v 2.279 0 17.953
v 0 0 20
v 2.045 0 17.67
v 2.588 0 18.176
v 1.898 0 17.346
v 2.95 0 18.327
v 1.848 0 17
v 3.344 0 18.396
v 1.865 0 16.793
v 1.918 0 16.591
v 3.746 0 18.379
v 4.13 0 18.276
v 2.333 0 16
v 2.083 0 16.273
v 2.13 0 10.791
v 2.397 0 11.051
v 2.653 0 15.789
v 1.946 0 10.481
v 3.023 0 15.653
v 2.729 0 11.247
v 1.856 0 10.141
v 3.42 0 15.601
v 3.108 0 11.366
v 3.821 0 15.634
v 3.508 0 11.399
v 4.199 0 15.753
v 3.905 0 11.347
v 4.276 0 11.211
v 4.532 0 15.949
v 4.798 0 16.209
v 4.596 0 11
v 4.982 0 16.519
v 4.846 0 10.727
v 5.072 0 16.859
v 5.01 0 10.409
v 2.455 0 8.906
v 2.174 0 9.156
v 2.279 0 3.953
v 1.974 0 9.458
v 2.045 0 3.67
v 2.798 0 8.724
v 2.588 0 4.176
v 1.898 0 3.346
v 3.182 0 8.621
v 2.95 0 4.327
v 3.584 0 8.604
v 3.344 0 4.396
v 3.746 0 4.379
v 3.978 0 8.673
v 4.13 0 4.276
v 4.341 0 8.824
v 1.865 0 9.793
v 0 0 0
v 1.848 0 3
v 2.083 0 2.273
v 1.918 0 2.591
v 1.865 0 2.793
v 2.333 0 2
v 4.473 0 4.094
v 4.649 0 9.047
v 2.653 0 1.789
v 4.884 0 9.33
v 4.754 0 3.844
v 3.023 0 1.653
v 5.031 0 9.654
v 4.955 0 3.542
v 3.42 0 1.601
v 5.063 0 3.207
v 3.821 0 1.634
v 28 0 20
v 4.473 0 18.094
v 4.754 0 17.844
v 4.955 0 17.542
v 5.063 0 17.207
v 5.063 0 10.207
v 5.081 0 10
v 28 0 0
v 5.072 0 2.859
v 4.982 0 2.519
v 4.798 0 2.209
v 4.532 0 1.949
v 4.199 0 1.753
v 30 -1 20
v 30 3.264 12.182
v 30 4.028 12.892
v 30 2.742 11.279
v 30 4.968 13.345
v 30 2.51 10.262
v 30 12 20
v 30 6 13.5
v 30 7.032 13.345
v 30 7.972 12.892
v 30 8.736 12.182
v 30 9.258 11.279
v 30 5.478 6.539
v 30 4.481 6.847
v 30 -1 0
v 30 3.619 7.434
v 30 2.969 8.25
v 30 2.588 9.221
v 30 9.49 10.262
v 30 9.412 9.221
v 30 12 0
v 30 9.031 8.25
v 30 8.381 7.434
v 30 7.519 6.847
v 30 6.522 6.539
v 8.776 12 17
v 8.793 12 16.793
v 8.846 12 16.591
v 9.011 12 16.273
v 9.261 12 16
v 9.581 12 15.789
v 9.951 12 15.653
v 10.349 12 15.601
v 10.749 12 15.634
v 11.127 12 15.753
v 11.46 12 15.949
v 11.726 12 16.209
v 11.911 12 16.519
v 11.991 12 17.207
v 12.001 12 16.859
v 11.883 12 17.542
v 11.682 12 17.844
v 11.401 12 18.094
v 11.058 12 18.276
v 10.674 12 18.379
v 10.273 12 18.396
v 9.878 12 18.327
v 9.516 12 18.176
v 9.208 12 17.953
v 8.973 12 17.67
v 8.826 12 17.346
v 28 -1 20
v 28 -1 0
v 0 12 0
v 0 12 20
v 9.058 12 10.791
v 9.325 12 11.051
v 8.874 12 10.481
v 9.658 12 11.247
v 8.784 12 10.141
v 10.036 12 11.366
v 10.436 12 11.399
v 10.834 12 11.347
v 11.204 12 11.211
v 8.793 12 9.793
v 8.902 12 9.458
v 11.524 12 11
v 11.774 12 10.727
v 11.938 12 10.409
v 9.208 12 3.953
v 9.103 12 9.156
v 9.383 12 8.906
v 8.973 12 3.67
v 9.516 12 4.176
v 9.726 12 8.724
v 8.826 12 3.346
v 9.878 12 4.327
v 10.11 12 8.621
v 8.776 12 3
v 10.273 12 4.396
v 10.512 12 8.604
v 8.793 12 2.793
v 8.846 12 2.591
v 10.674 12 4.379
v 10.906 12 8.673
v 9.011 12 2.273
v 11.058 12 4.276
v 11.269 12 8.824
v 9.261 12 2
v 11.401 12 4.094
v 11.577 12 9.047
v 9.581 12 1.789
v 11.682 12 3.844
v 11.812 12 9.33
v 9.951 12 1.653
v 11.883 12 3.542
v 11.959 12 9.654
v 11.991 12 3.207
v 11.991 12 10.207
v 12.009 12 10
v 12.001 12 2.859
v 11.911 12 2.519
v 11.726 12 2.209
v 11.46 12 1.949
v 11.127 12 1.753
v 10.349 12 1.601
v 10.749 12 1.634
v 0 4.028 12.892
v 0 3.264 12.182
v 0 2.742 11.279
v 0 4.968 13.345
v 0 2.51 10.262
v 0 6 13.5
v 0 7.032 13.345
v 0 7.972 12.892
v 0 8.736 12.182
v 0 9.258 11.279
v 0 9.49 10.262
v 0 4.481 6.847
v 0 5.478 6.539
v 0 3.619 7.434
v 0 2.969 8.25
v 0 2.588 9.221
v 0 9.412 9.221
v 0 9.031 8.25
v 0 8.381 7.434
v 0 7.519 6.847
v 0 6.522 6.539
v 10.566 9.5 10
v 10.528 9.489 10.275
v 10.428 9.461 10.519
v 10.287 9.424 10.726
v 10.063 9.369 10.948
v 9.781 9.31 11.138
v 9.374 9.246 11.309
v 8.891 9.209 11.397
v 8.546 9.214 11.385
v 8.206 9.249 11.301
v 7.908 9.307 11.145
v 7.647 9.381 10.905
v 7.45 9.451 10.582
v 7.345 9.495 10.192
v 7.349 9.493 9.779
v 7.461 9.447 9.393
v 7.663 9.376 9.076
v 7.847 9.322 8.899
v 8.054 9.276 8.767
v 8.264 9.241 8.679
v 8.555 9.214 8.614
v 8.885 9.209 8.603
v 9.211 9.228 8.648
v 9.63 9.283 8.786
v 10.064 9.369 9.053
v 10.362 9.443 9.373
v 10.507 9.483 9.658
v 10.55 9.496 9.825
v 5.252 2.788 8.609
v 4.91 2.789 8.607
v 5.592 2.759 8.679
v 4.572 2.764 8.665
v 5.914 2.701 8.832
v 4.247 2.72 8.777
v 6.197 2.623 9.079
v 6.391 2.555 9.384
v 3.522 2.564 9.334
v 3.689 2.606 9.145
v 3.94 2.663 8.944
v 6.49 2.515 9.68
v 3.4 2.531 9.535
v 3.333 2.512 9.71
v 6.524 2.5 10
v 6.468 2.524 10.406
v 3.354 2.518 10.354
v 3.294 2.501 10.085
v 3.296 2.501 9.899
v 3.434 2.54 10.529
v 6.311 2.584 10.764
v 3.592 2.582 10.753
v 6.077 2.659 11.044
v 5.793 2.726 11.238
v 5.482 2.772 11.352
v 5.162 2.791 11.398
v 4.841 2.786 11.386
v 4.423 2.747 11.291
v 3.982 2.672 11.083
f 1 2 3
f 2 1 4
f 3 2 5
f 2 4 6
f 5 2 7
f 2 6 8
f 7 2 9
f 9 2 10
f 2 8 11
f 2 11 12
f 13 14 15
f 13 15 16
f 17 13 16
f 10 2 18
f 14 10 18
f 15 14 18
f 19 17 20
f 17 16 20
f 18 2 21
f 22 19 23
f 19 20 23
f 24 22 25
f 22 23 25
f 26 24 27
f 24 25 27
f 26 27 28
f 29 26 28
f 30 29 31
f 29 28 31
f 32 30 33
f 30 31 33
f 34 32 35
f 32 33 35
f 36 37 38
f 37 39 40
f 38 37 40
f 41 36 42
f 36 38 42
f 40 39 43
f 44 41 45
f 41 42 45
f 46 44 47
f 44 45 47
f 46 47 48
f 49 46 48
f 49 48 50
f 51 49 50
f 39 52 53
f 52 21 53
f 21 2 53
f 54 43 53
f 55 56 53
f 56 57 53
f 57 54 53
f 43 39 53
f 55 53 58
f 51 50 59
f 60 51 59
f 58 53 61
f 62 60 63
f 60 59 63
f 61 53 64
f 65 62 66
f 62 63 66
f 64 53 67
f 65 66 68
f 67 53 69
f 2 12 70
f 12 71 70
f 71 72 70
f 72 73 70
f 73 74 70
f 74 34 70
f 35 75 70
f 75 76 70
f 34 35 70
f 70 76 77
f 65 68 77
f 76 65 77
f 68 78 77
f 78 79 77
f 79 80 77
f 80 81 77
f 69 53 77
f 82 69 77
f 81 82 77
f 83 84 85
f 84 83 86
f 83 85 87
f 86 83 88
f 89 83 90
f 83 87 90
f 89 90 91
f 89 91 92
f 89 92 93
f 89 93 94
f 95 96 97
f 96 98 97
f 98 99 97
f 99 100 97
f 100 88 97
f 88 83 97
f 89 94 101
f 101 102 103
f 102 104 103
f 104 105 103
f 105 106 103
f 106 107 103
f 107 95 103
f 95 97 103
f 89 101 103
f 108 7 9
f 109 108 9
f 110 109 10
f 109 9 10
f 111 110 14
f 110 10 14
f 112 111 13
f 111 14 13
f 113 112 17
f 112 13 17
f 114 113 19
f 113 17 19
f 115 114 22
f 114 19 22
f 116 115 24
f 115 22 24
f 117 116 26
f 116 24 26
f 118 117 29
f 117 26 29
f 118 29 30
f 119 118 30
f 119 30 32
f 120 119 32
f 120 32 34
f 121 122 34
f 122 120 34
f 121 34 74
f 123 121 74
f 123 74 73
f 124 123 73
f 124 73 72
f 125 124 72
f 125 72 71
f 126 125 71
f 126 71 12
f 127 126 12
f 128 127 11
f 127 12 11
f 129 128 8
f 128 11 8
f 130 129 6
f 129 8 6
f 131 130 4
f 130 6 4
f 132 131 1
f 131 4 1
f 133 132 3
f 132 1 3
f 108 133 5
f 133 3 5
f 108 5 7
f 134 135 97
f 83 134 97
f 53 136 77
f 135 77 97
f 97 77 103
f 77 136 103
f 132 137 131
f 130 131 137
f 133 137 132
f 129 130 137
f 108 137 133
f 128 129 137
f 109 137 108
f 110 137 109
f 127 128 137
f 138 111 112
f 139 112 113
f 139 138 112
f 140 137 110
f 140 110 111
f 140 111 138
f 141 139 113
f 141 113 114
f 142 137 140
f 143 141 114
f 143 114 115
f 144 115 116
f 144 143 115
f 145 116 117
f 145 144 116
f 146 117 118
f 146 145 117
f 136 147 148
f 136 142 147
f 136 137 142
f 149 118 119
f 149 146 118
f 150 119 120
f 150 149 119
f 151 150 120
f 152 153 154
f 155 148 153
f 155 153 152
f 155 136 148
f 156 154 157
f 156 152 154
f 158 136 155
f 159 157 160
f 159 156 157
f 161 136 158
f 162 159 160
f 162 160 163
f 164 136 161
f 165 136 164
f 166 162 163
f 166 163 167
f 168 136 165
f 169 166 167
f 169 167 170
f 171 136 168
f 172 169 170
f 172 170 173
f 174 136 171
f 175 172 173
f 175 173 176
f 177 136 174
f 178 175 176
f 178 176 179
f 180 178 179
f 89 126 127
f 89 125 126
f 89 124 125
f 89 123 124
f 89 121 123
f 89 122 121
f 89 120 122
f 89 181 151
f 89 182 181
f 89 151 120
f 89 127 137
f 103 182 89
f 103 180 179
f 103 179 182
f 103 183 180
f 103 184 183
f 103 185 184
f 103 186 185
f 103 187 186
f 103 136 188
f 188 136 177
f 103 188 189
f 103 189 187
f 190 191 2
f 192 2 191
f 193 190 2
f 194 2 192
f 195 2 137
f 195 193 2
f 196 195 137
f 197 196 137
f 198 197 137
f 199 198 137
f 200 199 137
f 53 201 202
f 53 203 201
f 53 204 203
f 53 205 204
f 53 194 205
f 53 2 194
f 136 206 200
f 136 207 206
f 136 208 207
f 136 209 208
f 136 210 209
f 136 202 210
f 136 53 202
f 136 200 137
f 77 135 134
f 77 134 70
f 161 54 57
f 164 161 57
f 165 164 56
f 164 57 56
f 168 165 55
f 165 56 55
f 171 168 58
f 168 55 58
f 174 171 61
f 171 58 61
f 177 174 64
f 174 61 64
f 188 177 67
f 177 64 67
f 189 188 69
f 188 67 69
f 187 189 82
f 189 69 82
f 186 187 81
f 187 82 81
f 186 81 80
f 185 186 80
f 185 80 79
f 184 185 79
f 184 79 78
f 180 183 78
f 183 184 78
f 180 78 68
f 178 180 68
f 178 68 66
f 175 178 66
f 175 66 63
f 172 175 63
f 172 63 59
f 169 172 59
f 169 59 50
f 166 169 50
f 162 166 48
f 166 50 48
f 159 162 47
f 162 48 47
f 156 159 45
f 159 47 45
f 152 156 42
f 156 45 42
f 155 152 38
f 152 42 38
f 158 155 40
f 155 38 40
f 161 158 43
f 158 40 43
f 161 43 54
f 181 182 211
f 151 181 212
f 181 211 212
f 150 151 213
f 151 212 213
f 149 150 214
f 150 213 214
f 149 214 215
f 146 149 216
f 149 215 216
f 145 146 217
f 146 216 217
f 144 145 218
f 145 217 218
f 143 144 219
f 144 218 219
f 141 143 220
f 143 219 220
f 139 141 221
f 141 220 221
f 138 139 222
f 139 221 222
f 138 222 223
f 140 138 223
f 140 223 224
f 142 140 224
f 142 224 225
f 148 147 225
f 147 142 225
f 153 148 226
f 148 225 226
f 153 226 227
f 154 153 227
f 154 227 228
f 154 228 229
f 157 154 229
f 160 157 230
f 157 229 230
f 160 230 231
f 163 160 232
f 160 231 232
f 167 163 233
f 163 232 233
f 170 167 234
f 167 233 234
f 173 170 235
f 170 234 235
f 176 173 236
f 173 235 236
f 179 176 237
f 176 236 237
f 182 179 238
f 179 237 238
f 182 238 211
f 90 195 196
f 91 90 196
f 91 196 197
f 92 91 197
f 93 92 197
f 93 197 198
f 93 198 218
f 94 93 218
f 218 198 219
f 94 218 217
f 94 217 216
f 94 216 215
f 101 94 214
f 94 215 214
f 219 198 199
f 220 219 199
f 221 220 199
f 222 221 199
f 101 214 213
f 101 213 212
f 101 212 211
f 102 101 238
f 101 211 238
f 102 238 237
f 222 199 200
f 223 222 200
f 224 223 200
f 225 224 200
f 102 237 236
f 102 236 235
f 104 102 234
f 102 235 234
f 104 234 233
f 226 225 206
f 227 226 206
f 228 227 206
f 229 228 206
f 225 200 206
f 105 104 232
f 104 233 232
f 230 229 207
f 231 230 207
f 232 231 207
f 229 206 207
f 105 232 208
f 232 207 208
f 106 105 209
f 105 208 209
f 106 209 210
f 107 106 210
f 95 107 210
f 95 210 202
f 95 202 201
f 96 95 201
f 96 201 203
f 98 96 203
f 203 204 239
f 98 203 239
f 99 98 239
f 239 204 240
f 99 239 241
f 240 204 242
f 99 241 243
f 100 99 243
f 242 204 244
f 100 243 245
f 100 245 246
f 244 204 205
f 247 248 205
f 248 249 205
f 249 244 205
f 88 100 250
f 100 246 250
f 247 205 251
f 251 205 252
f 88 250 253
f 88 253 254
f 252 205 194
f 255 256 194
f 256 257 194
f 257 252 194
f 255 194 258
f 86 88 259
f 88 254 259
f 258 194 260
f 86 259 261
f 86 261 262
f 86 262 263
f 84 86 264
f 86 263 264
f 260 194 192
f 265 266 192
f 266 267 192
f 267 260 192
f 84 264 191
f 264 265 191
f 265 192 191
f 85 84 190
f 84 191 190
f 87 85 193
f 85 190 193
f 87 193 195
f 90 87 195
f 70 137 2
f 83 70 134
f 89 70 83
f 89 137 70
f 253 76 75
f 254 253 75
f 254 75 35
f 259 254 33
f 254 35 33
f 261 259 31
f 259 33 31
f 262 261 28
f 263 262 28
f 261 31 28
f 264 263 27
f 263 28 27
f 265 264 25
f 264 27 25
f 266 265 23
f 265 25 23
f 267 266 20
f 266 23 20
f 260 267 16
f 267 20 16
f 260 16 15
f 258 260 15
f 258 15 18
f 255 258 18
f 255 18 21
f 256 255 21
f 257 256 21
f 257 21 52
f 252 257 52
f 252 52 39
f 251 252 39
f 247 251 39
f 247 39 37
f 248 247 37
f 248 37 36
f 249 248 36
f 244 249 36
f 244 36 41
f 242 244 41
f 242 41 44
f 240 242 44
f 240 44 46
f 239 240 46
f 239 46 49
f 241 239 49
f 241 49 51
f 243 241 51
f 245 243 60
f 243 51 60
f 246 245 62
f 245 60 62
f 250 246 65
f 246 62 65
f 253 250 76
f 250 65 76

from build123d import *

# Parameters (mm, degrees)
SKICA1_W                 = 30
SKICA1_H                 = 12
SKICA1_W_2               = 2
SKICA1_H_2               = 1
P_IDAT_VYSUNUT_M1_DEPTH  = 20
SKICA2_R                 = 3.5
ODEBRAT_VYSUNUT_M1_DEPTH = 34
SKICA3_R                 = 1.4
ODEBRAT_VYSUNUT_M2_DEPTH = 34


with BuildPart() as part:
    # Skica1 → Přidat vysunutím1 (new body)
    with BuildSketch(Plane.XY):
        with Locations((15, 6)):
            Rectangle(SKICA1_W, SKICA1_H)
        with Locations((29, -0.5)):
            Rectangle(SKICA1_W_2, SKICA1_H_2)
    extrude(amount=P_IDAT_VYSUNUT_M1_DEPTH)

    # Skica2 → Odebrat vysunutím1 (cut)
    with BuildSketch(Plane.ZY):
        with Locations((10, 6)):
            Circle(SKICA2_R)
    extrude(amount=-ODEBRAT_VYSUNUT_M1_DEPTH, mode=Mode.SUBTRACT)

    # Skica3 → Odebrat vysunutím2 (cut)
    with BuildSketch(Plane(origin=(0, 0, 0), x_dir=(0, 0, -1), z_dir=(-0.500000000000001, -0.866025403784438, 0))):
        with Locations(Location((-10, 3, 0), (0, 0, 90))):
            Circle(SKICA3_R)
        with Locations(Location((-17, 3, 0), (0, 0, 270))):
            Circle(SKICA3_R)
        with Locations(Location((-3, 3, 0), (0, 0, 270))):
            Circle(SKICA3_R)
    extrude(amount=-ODEBRAT_VYSUNUT_M2_DEPTH, mode=Mode.SUBTRACT)


solid = part.part
